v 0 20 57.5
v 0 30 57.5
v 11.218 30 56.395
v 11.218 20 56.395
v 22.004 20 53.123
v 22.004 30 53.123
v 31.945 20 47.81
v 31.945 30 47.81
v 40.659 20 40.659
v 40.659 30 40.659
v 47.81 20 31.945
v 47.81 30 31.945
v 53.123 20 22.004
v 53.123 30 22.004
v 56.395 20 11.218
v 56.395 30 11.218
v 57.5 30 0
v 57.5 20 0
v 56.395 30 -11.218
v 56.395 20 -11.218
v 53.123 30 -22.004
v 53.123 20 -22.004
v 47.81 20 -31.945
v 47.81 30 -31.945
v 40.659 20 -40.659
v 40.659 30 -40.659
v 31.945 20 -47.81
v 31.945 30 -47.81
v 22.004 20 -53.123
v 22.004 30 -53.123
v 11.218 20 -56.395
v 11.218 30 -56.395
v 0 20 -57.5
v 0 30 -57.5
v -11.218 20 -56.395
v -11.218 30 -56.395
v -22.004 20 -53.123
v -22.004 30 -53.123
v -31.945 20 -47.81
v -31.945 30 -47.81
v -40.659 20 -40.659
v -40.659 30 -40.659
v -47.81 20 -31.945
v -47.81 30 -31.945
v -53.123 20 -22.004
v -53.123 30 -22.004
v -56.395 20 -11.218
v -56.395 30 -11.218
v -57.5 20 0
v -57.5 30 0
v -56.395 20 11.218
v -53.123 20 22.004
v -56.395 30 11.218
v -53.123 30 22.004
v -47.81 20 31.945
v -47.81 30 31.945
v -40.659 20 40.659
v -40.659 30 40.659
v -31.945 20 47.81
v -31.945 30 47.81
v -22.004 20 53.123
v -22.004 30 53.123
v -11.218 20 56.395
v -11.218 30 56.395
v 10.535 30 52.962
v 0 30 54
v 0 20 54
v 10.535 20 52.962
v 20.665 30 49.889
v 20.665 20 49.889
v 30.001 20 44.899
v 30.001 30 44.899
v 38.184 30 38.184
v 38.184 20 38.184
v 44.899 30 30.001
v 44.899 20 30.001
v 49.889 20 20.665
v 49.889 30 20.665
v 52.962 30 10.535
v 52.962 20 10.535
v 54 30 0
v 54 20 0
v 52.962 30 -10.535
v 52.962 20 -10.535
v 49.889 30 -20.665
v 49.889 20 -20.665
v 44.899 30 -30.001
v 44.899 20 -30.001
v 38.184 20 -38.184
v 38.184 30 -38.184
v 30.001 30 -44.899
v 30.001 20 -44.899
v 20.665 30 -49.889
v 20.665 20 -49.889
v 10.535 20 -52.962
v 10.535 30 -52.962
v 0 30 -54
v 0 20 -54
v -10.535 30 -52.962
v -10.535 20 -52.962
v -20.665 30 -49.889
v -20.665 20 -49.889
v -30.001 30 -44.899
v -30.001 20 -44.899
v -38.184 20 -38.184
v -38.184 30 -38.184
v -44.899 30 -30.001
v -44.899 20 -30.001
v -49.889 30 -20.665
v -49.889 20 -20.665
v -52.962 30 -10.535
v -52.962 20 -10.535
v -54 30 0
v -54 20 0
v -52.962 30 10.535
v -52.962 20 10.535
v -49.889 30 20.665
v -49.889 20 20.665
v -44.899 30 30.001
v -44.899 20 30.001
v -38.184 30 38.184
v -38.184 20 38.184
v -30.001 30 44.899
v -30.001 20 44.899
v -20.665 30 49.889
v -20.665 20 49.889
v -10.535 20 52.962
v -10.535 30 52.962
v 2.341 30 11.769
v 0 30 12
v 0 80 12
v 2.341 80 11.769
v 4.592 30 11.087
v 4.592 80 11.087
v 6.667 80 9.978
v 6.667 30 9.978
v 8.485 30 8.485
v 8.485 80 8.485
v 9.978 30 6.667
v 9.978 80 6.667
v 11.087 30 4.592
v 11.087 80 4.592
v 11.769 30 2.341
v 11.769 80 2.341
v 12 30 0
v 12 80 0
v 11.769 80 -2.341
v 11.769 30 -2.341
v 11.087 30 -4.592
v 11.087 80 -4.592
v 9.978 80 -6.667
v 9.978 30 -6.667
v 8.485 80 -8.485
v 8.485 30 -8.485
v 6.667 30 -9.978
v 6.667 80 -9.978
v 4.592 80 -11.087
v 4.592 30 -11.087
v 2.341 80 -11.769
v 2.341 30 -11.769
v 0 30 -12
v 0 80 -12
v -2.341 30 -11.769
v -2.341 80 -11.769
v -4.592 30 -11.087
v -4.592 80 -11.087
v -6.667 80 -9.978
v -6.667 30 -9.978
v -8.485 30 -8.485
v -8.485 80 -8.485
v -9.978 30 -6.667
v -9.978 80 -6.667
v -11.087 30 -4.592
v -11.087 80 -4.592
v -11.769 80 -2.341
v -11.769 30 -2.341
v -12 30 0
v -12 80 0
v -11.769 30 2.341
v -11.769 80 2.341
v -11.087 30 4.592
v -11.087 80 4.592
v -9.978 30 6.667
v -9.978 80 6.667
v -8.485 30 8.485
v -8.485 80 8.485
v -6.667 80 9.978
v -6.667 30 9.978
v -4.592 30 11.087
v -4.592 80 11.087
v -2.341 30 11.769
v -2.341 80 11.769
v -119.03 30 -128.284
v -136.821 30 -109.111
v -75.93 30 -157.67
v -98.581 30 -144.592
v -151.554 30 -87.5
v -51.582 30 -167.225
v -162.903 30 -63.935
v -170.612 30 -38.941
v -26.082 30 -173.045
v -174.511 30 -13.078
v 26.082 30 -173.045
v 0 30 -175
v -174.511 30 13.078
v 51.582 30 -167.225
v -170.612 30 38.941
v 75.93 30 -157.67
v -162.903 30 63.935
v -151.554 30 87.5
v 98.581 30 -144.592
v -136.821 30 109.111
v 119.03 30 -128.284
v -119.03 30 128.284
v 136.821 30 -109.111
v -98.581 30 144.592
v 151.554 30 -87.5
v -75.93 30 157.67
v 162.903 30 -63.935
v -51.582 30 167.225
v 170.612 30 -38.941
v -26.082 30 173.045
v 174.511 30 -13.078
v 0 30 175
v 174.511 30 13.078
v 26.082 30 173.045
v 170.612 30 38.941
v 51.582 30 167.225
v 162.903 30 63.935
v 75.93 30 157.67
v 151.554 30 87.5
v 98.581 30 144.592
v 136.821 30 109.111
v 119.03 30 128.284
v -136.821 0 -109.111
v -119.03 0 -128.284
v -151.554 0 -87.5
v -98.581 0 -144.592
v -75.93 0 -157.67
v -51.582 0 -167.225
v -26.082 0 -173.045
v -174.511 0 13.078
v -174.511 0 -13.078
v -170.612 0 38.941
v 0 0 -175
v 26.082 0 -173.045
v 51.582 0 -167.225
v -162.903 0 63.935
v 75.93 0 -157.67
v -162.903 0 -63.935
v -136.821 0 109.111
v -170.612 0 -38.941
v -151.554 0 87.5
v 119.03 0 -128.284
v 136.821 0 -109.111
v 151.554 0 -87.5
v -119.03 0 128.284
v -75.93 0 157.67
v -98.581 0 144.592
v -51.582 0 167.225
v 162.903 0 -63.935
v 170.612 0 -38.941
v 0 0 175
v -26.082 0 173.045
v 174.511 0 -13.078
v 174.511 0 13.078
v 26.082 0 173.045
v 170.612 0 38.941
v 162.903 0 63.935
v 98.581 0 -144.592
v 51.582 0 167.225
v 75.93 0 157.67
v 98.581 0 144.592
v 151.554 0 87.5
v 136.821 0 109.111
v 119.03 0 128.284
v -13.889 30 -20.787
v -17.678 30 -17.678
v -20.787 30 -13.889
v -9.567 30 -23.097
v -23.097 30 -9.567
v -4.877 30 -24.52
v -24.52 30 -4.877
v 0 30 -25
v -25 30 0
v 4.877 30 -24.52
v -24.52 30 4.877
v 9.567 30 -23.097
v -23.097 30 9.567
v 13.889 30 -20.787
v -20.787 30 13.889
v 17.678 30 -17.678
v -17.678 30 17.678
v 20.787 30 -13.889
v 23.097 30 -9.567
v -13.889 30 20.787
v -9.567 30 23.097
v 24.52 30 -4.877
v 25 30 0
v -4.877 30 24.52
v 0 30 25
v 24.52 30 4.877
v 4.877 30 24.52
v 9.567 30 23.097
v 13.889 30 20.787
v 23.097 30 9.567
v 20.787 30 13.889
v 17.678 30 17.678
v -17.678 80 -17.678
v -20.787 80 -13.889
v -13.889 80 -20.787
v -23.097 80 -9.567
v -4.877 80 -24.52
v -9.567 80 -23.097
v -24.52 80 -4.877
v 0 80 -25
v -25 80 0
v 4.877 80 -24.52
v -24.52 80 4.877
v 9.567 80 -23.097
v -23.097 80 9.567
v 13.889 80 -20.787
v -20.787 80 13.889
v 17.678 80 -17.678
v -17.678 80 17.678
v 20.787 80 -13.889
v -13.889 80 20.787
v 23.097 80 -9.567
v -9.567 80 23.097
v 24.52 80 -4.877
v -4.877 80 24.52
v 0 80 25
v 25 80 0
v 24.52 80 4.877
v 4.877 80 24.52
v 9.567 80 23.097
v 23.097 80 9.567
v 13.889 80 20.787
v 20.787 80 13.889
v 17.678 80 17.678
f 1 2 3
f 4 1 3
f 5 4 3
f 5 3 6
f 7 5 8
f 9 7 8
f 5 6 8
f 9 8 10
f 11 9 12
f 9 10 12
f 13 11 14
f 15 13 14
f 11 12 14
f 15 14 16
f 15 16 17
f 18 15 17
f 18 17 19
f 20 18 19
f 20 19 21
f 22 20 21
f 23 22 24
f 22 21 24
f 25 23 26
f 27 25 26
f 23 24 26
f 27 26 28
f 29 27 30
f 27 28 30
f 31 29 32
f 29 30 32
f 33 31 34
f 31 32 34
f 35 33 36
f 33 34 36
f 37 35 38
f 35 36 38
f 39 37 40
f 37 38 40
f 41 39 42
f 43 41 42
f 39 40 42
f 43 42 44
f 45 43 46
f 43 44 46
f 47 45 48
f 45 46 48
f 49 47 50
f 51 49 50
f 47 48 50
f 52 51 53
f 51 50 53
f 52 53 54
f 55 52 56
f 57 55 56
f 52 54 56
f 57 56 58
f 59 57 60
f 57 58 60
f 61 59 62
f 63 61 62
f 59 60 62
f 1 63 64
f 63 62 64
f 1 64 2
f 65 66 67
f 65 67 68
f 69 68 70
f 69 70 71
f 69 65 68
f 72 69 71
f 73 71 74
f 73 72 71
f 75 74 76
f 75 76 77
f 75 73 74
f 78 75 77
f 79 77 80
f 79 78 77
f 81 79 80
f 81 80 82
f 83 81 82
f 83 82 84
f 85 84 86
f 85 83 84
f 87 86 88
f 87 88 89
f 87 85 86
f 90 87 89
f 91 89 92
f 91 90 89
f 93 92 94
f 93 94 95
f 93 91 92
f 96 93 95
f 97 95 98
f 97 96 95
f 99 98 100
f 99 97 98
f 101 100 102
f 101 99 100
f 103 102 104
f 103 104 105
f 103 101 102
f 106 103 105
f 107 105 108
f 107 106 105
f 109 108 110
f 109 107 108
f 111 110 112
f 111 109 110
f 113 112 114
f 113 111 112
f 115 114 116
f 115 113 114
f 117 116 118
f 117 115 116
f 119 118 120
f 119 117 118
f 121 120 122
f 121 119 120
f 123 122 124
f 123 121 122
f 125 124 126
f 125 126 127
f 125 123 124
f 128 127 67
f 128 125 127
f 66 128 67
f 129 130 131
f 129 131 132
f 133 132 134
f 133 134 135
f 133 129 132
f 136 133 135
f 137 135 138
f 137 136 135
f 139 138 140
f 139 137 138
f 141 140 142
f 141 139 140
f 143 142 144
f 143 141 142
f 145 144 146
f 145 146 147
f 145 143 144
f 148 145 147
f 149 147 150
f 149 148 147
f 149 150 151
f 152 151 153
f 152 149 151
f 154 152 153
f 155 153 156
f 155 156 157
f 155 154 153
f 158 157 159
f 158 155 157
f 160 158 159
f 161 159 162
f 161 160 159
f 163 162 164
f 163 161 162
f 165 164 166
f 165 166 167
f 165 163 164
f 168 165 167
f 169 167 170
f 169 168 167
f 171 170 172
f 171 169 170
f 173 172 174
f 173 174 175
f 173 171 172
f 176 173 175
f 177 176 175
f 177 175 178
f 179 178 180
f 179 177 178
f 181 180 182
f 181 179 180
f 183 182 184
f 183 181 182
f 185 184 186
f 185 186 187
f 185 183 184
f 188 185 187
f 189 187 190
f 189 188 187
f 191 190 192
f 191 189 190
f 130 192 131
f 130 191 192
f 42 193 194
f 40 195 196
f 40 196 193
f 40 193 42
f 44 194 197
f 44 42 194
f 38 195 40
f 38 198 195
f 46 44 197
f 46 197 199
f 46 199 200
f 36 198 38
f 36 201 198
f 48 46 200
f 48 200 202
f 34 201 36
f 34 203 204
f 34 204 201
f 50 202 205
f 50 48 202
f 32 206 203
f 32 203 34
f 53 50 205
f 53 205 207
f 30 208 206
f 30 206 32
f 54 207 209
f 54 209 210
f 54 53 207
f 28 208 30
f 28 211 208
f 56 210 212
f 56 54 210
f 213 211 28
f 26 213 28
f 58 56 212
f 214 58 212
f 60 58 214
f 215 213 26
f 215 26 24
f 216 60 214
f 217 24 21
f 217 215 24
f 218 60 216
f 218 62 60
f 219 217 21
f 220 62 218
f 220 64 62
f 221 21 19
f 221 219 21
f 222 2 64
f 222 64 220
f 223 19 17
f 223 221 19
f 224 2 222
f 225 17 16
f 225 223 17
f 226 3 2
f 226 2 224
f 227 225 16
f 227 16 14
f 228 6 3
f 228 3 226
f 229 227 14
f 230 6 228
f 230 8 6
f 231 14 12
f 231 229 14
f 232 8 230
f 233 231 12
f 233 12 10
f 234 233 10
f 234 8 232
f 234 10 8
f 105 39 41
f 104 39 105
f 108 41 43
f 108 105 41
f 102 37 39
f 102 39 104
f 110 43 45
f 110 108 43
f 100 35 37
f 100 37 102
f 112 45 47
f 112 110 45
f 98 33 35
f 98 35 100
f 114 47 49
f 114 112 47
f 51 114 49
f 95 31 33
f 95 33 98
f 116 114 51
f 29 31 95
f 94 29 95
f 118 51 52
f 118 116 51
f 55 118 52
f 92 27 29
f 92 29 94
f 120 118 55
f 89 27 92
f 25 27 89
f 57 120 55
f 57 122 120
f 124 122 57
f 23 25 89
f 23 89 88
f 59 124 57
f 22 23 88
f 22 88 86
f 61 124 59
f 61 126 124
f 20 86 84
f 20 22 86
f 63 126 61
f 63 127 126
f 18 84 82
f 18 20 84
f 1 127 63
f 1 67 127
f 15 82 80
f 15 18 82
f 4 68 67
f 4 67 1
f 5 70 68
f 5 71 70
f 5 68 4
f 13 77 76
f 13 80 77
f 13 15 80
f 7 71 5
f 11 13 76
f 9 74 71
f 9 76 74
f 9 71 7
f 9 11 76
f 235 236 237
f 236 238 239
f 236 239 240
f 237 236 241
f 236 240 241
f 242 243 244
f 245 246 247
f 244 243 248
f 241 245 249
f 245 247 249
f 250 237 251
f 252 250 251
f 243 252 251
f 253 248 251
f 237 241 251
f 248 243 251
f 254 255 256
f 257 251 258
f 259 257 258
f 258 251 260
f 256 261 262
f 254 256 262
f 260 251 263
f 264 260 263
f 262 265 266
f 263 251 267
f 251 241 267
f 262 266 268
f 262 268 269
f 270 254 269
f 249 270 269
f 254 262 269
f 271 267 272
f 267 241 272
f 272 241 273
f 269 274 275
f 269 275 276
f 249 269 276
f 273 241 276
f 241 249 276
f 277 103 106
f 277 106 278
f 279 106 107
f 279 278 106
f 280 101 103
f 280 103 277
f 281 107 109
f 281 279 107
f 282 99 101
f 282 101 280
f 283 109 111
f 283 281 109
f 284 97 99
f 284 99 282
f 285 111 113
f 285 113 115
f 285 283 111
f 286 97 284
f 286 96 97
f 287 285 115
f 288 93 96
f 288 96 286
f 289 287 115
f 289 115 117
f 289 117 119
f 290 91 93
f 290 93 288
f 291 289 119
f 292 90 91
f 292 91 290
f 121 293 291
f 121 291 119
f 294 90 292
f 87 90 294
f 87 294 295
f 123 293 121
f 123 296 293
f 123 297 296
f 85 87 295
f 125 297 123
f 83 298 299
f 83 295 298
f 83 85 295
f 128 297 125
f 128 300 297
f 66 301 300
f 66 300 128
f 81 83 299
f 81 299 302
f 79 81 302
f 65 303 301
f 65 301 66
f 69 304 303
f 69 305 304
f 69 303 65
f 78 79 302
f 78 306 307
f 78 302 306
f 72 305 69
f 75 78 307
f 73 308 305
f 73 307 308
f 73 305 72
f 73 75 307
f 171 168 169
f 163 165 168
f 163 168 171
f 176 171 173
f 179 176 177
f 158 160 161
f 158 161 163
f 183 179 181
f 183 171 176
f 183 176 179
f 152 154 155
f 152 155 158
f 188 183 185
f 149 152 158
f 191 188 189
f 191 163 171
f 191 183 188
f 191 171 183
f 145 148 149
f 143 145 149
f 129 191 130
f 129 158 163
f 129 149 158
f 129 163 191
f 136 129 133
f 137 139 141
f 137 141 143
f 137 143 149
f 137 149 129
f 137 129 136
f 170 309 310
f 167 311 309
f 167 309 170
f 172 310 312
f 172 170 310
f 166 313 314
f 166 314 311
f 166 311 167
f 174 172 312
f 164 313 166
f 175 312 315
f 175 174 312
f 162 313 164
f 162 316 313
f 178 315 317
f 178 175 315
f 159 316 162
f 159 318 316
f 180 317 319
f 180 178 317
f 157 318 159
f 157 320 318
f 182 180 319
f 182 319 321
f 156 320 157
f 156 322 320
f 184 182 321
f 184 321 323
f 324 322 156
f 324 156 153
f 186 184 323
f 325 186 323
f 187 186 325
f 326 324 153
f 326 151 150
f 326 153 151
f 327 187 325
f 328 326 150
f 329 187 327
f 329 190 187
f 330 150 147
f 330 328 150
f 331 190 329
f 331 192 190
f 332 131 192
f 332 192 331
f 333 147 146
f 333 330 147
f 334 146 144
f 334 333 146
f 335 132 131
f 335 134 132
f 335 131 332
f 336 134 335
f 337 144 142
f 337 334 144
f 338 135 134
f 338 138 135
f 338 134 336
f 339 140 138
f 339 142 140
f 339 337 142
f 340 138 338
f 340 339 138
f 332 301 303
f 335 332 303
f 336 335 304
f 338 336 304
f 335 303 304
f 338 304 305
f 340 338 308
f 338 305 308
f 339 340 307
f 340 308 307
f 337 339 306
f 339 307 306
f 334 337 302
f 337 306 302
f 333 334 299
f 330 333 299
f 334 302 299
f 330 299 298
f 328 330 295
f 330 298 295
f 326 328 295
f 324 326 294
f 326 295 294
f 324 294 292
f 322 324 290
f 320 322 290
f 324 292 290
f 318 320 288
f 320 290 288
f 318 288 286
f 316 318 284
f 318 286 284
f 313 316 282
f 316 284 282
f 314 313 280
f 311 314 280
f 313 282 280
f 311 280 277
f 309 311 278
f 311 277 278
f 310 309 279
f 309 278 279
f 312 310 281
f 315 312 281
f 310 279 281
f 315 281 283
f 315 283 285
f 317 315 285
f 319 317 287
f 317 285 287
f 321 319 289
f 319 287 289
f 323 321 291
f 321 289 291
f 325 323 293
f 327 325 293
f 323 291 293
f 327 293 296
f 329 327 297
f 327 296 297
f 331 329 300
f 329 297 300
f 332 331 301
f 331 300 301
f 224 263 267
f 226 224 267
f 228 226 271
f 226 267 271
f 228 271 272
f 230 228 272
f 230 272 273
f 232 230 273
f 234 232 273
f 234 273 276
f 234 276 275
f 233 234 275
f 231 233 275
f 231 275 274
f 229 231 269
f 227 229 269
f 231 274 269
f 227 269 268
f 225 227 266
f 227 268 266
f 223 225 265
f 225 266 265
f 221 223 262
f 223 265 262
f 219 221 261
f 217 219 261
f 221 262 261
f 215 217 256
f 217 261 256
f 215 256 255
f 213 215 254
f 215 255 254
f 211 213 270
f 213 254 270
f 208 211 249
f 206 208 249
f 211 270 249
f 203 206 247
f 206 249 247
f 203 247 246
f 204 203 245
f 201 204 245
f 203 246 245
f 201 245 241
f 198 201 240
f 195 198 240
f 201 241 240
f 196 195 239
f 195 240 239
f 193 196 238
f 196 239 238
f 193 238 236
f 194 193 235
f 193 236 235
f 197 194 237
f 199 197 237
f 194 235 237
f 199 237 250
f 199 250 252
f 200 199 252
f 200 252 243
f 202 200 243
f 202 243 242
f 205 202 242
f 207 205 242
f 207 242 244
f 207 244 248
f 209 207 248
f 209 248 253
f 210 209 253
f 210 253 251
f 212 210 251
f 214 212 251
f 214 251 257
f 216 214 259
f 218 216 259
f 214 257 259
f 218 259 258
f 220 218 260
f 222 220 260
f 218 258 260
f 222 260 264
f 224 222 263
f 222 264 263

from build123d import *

# Parameters (mm, degrees)
SKETCH1_R           = 175
BOSS_EXTRUDE1_DEPTH = 30
SKETCH2_R           = 25
SKETCH2_R_2         = 12
BOSS_EXTRUDE2_DEPTH = 50
SKETCH3_R           = 57.5
SKETCH3_R_2         = 54
CUT_EXTRUDE1_DEPTH  = 10


with BuildPart() as part:
    # Sketch1 → Boss-Extrude1 (new body)
    with BuildSketch(Plane(origin=(0, 0, 0), x_dir=(1, 0, 0), z_dir=(0, 1, 0))):
        with Locations(Location((0, 0, 0), (0, 0, 270))):
            Circle(SKETCH1_R)
    extrude(amount=BOSS_EXTRUDE1_DEPTH)

    # Sketch2 → Boss-Extrude2 (add)
    with BuildSketch(Plane(origin=(0, 30, 0), x_dir=(1, 0, 0), z_dir=(0, 1, 0))):
        with Locations(Location((0, 0, 0), (0, 0, 270))):
            Circle(SKETCH2_R)
        with Locations(Location((0, 0, 0), (0, 0, 270))):
            Circle(SKETCH2_R_2, mode=Mode.SUBTRACT)
    extrude(amount=BOSS_EXTRUDE2_DEPTH)

    # Sketch3 → Cut-Extrude1 (cut)
    with BuildSketch(Plane(origin=(0, 30, 0), x_dir=(1, 0, 0), z_dir=(0, 1, 0))):
        with Locations(Location((0, 0, 0), (0, 0, 270))):
            Circle(SKETCH3_R)
        with Locations(Location((0, 0, 0), (0, 0, 270))):
            Circle(SKETCH3_R_2, mode=Mode.SUBTRACT)
    extrude(amount=-CUT_EXTRUDE1_DEPTH, mode=Mode.SUBTRACT)


solid = part.part
